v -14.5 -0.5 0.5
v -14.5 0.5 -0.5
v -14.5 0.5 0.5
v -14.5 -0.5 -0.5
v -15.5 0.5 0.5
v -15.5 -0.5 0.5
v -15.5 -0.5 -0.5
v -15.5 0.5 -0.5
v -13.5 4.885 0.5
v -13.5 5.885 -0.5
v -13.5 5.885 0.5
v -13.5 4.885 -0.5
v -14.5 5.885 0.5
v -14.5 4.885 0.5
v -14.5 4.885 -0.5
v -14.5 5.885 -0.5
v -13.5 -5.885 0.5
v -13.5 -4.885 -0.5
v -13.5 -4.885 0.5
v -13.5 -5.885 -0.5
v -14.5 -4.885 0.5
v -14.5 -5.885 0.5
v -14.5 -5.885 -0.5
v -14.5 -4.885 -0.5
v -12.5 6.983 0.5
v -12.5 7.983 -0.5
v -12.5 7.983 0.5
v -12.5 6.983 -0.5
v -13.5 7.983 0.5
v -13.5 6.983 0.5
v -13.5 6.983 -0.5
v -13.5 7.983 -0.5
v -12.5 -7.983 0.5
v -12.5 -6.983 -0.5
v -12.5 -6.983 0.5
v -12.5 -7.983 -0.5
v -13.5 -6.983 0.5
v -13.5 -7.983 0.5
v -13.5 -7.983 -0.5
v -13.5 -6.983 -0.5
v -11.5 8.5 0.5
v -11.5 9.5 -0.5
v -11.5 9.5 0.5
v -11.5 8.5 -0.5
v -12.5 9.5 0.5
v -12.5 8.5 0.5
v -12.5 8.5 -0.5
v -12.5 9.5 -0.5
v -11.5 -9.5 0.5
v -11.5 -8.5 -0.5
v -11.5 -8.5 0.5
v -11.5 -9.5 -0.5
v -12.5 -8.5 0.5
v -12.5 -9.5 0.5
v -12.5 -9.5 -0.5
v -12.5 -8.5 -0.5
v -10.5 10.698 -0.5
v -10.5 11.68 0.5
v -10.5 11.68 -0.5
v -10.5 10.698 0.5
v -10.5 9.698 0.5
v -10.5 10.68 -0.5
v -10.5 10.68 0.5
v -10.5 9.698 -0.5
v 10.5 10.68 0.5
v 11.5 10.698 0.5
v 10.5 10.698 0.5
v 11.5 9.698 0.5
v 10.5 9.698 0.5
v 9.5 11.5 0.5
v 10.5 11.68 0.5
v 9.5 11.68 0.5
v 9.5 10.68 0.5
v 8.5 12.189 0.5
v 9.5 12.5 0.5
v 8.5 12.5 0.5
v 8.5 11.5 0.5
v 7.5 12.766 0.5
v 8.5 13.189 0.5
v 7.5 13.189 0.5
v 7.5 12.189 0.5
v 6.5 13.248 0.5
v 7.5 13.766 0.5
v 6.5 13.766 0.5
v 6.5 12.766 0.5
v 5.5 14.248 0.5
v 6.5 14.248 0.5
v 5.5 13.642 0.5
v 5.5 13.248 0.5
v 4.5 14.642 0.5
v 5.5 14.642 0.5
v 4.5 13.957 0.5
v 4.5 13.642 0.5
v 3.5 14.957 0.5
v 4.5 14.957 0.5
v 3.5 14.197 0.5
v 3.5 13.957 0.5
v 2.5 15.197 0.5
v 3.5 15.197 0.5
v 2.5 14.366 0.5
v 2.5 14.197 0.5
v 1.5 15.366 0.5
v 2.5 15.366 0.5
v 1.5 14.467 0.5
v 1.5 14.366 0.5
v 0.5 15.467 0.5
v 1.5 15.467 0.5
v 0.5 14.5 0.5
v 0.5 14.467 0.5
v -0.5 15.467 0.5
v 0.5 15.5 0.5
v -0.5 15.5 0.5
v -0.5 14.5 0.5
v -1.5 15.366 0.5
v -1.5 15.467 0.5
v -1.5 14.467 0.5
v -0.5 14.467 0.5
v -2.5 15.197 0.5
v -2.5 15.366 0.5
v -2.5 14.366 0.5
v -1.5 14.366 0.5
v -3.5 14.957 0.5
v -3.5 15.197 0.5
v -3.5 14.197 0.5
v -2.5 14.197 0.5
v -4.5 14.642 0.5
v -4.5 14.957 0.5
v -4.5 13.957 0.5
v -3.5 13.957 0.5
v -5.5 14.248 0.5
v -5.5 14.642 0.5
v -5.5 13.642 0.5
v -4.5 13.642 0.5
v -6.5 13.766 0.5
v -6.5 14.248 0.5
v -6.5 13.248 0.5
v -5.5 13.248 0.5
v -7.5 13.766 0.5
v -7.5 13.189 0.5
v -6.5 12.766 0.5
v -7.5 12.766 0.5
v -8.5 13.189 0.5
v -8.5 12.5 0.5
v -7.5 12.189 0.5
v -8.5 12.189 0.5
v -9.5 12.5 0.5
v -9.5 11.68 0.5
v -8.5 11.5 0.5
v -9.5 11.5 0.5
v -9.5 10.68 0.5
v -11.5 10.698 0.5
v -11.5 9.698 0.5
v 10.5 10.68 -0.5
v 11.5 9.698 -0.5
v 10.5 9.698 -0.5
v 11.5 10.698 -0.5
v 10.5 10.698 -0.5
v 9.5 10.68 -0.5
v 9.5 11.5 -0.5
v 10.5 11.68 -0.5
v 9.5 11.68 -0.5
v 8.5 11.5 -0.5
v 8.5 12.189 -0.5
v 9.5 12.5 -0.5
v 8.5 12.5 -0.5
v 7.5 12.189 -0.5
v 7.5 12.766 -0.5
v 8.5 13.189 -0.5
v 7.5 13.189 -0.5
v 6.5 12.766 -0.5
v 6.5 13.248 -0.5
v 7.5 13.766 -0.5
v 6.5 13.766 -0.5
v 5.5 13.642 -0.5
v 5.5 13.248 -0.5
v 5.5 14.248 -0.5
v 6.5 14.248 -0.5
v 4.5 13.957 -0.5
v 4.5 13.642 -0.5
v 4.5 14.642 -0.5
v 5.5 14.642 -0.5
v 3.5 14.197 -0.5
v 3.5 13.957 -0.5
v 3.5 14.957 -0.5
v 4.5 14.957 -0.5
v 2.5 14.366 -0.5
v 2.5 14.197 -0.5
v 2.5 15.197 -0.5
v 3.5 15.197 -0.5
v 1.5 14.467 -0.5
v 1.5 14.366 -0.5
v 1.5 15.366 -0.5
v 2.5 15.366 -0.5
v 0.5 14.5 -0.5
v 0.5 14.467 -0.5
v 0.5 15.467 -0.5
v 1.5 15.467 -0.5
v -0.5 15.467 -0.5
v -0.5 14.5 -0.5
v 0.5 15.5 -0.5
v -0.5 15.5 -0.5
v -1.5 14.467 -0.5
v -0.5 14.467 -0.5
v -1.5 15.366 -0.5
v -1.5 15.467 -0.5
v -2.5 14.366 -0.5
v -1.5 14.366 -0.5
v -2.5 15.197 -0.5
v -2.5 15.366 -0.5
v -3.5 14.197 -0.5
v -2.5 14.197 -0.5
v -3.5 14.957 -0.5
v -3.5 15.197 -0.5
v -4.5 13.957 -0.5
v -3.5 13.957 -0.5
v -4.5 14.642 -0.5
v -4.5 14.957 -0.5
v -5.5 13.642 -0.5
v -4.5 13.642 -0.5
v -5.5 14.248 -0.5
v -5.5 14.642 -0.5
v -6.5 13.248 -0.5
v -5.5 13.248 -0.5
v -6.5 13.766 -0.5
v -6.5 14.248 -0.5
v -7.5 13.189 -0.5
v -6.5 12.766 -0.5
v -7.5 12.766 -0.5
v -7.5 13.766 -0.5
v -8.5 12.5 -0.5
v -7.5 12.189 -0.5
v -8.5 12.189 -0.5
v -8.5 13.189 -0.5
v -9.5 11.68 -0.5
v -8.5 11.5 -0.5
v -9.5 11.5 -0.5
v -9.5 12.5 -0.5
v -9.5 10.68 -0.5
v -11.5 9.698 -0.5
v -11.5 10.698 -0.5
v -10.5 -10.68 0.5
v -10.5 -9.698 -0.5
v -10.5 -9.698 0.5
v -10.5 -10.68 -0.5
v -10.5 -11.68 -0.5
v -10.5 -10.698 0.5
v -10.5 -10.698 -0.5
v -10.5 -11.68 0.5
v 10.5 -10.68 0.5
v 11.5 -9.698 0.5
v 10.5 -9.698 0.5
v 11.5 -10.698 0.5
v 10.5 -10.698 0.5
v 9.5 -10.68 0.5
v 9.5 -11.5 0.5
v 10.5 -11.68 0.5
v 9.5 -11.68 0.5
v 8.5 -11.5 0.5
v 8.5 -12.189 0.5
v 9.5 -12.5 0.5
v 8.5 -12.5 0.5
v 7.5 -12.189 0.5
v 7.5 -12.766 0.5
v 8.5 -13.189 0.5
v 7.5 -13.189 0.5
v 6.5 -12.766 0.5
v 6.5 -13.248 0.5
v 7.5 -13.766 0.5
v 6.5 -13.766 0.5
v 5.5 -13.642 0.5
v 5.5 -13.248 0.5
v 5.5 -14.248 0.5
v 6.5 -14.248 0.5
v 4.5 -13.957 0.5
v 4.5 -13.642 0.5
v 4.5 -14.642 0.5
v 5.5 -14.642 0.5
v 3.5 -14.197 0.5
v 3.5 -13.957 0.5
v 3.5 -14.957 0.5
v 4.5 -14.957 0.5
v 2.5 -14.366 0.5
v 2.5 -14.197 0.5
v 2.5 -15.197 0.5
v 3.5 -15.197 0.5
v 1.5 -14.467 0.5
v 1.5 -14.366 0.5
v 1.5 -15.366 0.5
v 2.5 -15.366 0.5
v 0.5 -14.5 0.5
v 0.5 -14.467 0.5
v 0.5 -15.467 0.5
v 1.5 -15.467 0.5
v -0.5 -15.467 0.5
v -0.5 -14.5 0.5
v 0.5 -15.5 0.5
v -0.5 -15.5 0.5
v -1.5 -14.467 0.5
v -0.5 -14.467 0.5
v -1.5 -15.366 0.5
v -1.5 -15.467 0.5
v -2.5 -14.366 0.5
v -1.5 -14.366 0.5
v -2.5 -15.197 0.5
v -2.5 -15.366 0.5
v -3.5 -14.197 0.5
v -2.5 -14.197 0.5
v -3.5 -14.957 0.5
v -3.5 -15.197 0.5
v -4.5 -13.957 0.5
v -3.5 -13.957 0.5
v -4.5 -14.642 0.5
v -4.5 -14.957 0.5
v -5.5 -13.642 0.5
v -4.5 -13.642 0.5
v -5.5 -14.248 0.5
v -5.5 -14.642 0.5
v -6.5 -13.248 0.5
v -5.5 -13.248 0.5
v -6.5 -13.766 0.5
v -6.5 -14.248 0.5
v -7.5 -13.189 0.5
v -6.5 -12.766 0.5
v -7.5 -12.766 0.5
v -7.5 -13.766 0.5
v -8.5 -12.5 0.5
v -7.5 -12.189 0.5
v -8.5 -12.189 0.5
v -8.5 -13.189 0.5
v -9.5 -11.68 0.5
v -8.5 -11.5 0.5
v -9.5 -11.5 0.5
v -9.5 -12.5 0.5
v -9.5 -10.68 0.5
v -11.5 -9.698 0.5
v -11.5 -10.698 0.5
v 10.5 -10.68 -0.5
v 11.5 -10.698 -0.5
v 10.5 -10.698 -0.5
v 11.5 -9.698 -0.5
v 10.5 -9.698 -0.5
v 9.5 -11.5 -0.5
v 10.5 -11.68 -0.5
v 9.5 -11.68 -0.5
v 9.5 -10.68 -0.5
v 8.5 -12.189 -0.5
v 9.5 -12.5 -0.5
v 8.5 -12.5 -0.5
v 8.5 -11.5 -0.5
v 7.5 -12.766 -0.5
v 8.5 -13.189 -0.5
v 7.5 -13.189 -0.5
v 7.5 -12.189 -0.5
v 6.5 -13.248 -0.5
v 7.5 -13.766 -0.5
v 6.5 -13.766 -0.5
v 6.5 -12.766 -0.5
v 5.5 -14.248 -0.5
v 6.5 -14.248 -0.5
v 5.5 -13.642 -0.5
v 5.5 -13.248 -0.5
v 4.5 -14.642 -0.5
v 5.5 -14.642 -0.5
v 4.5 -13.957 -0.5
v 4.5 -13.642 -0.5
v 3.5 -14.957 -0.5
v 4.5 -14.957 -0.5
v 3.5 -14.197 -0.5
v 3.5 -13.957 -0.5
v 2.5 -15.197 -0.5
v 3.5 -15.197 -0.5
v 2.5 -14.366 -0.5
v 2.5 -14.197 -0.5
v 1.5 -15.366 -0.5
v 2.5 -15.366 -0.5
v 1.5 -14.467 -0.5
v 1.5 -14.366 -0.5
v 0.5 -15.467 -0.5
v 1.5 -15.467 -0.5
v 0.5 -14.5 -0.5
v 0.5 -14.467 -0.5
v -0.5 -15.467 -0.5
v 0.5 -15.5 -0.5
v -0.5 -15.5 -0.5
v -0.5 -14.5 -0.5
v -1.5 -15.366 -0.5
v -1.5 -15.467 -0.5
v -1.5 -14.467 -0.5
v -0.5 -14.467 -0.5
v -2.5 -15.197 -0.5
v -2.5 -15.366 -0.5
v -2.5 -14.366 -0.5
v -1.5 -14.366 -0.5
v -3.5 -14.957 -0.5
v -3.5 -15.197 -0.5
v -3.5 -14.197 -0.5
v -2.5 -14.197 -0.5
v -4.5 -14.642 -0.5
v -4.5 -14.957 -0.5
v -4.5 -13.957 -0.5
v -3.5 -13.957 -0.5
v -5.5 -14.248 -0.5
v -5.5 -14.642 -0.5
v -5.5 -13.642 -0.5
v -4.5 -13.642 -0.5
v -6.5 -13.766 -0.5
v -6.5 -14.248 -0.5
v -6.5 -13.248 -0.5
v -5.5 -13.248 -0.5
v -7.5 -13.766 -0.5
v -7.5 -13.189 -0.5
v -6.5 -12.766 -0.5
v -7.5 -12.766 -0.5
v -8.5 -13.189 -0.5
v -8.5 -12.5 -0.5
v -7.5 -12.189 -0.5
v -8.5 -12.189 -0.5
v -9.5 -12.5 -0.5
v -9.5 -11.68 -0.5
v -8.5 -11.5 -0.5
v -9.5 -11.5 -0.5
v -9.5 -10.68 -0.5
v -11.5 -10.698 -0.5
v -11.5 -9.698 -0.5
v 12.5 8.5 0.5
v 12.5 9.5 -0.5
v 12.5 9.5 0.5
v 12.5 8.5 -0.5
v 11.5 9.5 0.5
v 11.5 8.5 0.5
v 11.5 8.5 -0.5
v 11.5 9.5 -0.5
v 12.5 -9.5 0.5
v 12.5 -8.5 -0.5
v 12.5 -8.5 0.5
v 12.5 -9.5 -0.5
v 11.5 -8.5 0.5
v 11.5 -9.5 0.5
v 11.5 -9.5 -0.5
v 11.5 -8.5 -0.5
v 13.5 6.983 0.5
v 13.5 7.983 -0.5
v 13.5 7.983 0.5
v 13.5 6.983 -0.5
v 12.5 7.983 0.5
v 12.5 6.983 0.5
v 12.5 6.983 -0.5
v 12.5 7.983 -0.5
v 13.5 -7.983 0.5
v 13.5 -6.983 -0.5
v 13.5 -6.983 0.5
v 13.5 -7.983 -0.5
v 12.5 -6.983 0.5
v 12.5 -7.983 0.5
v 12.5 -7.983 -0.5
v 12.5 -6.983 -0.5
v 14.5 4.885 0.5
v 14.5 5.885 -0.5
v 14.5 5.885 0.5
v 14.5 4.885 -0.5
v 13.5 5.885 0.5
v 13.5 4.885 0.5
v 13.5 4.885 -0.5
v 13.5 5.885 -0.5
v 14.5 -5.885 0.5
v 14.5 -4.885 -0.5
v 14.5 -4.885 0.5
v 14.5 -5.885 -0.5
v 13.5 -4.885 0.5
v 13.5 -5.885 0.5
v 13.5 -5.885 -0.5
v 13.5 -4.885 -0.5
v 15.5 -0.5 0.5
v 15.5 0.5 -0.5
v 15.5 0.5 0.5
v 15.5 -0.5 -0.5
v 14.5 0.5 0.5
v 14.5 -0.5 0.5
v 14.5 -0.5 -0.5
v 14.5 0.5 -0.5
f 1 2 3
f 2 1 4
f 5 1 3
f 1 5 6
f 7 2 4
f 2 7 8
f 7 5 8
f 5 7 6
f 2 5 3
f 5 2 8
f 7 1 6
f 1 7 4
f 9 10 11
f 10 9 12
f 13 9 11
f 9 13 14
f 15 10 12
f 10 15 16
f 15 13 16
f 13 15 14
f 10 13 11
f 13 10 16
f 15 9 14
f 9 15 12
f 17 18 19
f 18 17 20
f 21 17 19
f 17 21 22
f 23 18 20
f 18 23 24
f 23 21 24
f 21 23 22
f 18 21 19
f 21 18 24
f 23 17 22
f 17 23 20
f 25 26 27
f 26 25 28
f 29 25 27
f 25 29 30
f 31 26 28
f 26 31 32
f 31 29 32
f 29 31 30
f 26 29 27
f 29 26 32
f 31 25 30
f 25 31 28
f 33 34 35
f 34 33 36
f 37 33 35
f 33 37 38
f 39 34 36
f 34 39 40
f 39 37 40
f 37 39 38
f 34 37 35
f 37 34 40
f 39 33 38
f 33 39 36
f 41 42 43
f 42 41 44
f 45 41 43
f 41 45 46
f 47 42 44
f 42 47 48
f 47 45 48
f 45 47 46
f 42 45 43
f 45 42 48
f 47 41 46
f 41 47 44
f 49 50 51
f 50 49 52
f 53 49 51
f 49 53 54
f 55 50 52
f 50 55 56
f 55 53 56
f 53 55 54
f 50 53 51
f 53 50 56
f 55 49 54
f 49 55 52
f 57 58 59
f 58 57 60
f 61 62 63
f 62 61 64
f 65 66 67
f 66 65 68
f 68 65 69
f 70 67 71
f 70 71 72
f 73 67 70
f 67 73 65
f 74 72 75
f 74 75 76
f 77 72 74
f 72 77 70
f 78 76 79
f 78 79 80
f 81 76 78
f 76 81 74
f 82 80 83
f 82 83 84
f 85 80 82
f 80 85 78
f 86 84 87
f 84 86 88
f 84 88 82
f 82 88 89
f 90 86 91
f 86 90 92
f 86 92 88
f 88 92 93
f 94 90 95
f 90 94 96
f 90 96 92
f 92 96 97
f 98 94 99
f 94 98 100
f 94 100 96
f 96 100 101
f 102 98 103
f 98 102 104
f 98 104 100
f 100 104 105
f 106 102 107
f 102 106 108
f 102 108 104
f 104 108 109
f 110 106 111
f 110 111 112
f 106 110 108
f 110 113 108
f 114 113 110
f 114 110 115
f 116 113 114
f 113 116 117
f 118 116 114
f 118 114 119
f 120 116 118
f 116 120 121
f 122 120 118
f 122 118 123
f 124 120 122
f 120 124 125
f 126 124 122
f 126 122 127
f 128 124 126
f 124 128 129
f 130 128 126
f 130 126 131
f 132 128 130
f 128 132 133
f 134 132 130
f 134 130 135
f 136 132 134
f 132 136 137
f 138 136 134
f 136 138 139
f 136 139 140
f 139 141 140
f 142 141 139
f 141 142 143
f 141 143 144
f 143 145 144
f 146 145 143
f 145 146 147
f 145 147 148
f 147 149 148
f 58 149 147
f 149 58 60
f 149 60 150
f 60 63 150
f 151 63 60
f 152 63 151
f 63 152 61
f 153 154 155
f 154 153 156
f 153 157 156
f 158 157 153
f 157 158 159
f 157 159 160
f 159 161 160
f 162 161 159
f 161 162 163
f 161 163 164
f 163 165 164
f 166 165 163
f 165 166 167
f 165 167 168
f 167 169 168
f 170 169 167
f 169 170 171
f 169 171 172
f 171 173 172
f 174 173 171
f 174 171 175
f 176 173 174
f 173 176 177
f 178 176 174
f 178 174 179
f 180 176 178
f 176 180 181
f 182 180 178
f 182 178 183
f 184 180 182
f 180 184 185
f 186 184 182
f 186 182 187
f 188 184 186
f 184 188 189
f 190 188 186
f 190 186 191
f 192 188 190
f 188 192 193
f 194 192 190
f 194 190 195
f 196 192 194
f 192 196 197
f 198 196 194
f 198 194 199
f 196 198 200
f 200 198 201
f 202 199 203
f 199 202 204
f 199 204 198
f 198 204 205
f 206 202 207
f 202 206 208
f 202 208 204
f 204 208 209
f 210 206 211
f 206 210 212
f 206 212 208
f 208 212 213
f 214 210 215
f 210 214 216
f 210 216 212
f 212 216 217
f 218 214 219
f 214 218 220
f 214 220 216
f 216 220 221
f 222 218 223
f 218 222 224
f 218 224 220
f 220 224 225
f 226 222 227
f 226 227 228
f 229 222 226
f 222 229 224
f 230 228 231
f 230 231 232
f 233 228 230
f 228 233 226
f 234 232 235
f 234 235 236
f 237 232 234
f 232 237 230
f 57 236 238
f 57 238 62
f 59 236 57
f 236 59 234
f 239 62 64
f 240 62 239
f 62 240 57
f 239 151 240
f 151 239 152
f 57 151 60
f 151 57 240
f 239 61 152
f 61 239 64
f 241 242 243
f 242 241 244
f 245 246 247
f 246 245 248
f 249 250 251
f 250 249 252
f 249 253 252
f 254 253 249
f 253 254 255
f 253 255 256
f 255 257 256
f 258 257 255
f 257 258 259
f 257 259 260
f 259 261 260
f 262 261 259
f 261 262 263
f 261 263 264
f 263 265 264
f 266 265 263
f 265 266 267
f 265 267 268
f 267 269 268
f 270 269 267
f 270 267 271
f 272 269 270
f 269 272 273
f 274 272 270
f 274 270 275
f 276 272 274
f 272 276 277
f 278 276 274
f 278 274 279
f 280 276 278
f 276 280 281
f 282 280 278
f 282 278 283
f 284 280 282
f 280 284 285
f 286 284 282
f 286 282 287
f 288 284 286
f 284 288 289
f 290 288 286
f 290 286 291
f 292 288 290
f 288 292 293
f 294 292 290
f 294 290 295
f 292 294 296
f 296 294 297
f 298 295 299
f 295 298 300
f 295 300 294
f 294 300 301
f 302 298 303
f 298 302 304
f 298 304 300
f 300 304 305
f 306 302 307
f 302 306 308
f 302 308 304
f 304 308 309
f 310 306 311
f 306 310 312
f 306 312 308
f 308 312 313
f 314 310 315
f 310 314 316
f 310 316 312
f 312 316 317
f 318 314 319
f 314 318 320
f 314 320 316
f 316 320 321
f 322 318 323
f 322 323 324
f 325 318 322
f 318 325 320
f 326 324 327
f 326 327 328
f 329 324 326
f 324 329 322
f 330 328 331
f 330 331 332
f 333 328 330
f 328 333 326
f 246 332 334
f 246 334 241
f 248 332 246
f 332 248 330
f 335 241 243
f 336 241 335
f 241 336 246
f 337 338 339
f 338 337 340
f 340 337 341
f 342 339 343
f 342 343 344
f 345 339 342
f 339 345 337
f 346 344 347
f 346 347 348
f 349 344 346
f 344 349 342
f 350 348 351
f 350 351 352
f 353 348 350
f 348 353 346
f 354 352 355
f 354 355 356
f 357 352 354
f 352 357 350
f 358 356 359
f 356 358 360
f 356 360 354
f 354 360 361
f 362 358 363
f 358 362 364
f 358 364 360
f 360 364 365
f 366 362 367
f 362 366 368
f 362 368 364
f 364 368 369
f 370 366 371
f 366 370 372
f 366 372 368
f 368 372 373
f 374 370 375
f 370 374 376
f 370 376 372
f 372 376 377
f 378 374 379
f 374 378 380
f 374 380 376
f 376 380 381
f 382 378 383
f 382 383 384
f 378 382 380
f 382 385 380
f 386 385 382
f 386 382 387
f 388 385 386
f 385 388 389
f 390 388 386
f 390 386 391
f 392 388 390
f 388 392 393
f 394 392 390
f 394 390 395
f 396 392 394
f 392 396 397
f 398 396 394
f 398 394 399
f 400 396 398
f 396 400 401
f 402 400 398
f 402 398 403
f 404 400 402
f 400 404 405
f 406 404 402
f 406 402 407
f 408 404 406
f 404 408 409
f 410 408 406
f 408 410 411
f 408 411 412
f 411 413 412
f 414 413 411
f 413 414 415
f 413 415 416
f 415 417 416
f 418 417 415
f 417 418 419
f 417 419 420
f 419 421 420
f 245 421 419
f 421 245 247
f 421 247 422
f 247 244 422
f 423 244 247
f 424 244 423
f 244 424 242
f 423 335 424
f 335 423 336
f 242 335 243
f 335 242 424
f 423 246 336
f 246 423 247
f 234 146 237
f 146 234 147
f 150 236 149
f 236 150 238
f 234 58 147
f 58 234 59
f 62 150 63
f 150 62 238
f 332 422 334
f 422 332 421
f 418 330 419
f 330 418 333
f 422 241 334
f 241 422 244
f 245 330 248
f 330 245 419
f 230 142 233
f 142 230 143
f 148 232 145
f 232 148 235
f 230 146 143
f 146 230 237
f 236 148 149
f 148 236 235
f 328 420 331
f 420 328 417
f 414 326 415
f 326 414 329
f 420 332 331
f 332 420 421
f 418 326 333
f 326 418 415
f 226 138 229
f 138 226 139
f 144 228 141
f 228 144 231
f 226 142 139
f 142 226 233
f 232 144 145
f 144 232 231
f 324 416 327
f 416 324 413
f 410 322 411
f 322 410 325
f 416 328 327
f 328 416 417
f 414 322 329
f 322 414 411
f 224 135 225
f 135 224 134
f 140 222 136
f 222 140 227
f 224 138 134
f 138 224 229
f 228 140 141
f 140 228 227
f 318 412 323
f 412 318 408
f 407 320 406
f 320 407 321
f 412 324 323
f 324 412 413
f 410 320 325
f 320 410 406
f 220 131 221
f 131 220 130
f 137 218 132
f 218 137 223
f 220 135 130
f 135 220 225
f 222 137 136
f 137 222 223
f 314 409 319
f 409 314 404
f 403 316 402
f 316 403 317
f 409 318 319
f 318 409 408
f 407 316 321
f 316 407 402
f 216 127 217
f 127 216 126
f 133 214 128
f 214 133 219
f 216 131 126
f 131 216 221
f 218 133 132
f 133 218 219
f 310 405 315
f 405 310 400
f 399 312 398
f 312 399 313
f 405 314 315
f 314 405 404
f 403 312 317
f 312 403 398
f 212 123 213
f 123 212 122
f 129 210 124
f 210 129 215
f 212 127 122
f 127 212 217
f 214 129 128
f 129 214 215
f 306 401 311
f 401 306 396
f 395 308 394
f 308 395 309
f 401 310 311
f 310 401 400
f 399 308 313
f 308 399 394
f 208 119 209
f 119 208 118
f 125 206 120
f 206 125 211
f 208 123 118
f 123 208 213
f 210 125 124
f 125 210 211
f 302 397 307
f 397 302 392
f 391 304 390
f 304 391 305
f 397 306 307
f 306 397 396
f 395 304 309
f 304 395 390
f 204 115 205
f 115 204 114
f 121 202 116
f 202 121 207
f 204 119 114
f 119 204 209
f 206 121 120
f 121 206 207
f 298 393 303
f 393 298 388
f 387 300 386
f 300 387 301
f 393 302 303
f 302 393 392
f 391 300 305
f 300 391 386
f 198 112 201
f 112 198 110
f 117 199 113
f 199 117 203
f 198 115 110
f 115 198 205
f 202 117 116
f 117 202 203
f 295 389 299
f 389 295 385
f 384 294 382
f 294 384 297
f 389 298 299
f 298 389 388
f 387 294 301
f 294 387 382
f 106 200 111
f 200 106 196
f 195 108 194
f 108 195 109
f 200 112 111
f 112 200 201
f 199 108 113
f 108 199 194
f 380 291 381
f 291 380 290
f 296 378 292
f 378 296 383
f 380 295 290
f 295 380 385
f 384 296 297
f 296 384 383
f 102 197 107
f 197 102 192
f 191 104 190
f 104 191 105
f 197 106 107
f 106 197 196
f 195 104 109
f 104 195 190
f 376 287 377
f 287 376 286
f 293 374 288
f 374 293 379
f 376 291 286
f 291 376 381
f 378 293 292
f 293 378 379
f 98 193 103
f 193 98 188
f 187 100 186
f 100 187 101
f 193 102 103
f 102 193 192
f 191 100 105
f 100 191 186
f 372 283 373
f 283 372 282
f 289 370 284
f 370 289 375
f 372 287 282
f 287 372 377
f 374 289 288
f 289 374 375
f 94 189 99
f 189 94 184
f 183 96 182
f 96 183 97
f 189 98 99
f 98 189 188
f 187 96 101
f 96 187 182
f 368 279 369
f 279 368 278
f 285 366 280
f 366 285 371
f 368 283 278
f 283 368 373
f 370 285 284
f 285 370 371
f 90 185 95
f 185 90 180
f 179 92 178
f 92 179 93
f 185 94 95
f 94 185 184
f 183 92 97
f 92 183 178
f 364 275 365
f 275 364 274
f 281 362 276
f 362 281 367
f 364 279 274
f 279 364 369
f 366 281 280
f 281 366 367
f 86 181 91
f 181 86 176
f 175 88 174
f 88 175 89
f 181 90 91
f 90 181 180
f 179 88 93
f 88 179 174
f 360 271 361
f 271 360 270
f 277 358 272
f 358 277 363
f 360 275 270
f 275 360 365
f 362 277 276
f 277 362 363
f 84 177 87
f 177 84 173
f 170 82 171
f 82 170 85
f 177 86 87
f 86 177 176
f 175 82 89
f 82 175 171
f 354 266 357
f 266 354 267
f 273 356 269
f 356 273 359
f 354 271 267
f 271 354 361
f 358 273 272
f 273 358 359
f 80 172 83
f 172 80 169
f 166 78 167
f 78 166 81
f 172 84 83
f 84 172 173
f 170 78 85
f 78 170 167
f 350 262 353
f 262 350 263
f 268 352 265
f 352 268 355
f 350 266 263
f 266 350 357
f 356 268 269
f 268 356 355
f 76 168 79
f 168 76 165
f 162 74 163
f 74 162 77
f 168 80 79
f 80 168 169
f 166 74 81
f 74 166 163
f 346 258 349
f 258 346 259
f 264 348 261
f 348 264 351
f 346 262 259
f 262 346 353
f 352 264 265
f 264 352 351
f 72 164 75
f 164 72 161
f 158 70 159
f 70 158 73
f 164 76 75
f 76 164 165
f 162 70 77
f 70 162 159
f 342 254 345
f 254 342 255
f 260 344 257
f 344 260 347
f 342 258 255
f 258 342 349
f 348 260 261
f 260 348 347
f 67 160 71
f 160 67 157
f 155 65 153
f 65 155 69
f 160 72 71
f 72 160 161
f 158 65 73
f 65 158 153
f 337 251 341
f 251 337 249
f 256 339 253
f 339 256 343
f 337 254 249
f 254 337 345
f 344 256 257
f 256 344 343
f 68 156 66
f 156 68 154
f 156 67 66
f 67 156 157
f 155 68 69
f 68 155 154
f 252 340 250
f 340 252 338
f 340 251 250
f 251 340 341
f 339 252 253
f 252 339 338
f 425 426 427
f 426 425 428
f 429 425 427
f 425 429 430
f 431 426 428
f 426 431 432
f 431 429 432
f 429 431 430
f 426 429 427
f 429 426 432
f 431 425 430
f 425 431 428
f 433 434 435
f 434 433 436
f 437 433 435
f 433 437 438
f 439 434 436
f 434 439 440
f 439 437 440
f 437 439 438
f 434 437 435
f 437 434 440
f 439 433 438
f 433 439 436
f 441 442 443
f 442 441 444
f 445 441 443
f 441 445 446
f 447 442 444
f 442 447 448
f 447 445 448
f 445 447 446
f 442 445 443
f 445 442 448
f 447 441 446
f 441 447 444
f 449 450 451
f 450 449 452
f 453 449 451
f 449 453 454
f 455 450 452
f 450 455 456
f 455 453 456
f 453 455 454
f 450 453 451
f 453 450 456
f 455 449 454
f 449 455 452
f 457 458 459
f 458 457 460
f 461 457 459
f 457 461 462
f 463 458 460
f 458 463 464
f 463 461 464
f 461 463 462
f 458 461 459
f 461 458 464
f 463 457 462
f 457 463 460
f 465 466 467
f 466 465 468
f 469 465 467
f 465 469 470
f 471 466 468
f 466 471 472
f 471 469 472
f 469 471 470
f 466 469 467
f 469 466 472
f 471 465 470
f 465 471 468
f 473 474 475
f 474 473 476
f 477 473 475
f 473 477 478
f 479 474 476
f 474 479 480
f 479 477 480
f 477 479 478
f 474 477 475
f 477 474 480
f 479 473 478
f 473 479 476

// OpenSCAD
module circleX(r, range){
 for(x=[-range:1:range]){
 //x*x + y*y = r*r
  y = sqrt((r*r) - (x*x));
  if(is_num(y)){
   translate([x, y, 0]){
    cube(1, true);
   }
   translate([x, -y, 0]){
   cube(1, true);
   }
  }
 }  
}circleX(15, 20);
